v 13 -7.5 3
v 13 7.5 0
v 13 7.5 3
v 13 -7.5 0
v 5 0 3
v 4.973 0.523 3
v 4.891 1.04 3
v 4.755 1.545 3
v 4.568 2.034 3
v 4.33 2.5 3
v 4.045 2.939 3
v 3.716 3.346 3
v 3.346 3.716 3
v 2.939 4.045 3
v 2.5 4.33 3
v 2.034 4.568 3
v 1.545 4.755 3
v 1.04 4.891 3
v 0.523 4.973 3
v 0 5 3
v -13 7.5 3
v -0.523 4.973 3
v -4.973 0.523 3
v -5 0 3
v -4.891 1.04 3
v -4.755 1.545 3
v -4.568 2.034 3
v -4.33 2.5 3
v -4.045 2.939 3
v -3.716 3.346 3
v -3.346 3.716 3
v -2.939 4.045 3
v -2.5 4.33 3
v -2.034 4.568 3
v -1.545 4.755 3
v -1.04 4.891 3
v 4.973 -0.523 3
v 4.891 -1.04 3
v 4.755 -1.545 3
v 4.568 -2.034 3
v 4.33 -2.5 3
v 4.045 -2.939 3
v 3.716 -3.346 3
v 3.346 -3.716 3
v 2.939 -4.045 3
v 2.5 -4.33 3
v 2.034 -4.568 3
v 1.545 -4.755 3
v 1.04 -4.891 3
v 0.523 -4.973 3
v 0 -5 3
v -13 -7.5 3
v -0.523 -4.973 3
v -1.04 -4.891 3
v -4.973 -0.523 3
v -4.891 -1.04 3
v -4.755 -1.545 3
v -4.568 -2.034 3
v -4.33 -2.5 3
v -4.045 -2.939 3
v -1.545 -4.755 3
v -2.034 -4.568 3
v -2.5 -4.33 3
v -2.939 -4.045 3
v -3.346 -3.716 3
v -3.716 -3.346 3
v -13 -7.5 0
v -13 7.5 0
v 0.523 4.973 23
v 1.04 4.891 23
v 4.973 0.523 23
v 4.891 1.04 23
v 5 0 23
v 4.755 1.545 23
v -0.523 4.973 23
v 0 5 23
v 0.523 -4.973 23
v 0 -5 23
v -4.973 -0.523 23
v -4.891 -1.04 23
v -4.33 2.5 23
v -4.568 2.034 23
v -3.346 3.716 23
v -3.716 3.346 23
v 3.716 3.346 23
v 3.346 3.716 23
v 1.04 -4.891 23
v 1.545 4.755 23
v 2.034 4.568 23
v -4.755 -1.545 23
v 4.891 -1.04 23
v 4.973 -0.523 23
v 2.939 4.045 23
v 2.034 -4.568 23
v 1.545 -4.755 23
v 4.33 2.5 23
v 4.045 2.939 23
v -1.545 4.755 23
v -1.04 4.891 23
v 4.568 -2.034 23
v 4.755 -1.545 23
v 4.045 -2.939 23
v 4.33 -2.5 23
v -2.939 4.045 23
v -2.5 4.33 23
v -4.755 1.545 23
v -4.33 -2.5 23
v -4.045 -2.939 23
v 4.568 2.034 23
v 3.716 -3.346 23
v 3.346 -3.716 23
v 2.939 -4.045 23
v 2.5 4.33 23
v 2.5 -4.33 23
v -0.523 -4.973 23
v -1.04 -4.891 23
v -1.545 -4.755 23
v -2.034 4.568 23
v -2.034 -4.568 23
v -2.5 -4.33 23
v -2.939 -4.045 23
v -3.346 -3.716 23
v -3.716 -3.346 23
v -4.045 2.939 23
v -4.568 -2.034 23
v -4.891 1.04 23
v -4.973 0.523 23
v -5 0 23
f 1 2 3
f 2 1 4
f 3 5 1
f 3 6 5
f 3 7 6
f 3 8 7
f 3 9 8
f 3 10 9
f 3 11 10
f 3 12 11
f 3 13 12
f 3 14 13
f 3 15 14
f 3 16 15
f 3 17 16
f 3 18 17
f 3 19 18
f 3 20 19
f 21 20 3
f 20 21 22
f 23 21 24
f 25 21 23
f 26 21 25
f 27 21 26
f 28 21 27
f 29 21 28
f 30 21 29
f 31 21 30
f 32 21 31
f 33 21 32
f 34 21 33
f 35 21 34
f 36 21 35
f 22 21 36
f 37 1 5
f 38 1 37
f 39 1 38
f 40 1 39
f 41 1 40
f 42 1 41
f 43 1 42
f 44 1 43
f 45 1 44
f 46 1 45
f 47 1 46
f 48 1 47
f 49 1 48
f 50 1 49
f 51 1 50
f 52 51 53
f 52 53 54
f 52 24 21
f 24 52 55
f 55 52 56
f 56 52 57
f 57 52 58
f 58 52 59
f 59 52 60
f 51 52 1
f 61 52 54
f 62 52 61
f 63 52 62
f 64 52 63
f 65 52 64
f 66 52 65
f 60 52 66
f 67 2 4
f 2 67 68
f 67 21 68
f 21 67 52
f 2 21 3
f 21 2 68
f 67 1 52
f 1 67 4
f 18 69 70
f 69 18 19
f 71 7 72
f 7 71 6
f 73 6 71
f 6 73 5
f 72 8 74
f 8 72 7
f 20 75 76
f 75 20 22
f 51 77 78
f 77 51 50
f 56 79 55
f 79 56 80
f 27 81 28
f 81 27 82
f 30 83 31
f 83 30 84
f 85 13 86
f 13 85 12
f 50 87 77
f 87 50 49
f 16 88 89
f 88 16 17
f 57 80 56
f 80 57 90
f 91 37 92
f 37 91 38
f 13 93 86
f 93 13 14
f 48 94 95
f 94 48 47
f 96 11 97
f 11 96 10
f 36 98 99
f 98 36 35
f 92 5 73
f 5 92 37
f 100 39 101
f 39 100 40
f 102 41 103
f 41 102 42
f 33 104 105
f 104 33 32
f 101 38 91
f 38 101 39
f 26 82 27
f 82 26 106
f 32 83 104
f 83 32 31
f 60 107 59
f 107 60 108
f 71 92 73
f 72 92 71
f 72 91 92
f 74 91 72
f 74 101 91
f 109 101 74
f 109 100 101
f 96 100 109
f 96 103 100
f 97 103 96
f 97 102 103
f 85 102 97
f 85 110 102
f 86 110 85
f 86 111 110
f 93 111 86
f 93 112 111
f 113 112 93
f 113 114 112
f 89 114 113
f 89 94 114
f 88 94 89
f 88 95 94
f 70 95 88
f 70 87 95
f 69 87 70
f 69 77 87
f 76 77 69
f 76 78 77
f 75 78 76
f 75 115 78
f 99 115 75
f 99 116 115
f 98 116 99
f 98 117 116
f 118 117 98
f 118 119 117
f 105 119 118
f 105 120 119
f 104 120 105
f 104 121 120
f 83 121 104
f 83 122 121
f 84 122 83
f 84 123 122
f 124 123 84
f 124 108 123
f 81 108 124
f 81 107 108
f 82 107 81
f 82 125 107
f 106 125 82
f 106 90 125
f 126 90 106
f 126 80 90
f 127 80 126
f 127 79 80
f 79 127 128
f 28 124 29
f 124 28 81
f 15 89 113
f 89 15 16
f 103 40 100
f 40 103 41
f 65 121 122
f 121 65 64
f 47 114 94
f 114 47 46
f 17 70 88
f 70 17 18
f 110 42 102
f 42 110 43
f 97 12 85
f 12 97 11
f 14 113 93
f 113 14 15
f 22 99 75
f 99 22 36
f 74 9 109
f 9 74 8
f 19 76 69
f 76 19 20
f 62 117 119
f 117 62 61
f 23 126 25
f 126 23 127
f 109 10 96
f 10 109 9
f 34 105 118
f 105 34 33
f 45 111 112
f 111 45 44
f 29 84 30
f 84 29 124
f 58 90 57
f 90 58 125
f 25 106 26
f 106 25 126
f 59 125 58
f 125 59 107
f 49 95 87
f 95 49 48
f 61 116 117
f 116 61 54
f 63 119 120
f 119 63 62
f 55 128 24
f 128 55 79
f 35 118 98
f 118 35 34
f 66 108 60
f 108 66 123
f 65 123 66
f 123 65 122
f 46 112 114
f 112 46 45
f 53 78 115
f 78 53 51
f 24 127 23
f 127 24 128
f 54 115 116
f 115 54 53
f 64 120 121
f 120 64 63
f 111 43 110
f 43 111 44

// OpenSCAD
// T-head slot bolt.
$fn = 60;
eps = 0.02;
shaft_d = 10;
head_l = 26;
shaft_l = 20;
head_w = shaft_d + 5;
head_h = 3;
union() {
    translate([-head_l/2,-head_w/2,0]) cube([head_l,head_w,head_h]);
    translate([0,0,head_h]) cylinder(d=shaft_d,h=shaft_l);
}
